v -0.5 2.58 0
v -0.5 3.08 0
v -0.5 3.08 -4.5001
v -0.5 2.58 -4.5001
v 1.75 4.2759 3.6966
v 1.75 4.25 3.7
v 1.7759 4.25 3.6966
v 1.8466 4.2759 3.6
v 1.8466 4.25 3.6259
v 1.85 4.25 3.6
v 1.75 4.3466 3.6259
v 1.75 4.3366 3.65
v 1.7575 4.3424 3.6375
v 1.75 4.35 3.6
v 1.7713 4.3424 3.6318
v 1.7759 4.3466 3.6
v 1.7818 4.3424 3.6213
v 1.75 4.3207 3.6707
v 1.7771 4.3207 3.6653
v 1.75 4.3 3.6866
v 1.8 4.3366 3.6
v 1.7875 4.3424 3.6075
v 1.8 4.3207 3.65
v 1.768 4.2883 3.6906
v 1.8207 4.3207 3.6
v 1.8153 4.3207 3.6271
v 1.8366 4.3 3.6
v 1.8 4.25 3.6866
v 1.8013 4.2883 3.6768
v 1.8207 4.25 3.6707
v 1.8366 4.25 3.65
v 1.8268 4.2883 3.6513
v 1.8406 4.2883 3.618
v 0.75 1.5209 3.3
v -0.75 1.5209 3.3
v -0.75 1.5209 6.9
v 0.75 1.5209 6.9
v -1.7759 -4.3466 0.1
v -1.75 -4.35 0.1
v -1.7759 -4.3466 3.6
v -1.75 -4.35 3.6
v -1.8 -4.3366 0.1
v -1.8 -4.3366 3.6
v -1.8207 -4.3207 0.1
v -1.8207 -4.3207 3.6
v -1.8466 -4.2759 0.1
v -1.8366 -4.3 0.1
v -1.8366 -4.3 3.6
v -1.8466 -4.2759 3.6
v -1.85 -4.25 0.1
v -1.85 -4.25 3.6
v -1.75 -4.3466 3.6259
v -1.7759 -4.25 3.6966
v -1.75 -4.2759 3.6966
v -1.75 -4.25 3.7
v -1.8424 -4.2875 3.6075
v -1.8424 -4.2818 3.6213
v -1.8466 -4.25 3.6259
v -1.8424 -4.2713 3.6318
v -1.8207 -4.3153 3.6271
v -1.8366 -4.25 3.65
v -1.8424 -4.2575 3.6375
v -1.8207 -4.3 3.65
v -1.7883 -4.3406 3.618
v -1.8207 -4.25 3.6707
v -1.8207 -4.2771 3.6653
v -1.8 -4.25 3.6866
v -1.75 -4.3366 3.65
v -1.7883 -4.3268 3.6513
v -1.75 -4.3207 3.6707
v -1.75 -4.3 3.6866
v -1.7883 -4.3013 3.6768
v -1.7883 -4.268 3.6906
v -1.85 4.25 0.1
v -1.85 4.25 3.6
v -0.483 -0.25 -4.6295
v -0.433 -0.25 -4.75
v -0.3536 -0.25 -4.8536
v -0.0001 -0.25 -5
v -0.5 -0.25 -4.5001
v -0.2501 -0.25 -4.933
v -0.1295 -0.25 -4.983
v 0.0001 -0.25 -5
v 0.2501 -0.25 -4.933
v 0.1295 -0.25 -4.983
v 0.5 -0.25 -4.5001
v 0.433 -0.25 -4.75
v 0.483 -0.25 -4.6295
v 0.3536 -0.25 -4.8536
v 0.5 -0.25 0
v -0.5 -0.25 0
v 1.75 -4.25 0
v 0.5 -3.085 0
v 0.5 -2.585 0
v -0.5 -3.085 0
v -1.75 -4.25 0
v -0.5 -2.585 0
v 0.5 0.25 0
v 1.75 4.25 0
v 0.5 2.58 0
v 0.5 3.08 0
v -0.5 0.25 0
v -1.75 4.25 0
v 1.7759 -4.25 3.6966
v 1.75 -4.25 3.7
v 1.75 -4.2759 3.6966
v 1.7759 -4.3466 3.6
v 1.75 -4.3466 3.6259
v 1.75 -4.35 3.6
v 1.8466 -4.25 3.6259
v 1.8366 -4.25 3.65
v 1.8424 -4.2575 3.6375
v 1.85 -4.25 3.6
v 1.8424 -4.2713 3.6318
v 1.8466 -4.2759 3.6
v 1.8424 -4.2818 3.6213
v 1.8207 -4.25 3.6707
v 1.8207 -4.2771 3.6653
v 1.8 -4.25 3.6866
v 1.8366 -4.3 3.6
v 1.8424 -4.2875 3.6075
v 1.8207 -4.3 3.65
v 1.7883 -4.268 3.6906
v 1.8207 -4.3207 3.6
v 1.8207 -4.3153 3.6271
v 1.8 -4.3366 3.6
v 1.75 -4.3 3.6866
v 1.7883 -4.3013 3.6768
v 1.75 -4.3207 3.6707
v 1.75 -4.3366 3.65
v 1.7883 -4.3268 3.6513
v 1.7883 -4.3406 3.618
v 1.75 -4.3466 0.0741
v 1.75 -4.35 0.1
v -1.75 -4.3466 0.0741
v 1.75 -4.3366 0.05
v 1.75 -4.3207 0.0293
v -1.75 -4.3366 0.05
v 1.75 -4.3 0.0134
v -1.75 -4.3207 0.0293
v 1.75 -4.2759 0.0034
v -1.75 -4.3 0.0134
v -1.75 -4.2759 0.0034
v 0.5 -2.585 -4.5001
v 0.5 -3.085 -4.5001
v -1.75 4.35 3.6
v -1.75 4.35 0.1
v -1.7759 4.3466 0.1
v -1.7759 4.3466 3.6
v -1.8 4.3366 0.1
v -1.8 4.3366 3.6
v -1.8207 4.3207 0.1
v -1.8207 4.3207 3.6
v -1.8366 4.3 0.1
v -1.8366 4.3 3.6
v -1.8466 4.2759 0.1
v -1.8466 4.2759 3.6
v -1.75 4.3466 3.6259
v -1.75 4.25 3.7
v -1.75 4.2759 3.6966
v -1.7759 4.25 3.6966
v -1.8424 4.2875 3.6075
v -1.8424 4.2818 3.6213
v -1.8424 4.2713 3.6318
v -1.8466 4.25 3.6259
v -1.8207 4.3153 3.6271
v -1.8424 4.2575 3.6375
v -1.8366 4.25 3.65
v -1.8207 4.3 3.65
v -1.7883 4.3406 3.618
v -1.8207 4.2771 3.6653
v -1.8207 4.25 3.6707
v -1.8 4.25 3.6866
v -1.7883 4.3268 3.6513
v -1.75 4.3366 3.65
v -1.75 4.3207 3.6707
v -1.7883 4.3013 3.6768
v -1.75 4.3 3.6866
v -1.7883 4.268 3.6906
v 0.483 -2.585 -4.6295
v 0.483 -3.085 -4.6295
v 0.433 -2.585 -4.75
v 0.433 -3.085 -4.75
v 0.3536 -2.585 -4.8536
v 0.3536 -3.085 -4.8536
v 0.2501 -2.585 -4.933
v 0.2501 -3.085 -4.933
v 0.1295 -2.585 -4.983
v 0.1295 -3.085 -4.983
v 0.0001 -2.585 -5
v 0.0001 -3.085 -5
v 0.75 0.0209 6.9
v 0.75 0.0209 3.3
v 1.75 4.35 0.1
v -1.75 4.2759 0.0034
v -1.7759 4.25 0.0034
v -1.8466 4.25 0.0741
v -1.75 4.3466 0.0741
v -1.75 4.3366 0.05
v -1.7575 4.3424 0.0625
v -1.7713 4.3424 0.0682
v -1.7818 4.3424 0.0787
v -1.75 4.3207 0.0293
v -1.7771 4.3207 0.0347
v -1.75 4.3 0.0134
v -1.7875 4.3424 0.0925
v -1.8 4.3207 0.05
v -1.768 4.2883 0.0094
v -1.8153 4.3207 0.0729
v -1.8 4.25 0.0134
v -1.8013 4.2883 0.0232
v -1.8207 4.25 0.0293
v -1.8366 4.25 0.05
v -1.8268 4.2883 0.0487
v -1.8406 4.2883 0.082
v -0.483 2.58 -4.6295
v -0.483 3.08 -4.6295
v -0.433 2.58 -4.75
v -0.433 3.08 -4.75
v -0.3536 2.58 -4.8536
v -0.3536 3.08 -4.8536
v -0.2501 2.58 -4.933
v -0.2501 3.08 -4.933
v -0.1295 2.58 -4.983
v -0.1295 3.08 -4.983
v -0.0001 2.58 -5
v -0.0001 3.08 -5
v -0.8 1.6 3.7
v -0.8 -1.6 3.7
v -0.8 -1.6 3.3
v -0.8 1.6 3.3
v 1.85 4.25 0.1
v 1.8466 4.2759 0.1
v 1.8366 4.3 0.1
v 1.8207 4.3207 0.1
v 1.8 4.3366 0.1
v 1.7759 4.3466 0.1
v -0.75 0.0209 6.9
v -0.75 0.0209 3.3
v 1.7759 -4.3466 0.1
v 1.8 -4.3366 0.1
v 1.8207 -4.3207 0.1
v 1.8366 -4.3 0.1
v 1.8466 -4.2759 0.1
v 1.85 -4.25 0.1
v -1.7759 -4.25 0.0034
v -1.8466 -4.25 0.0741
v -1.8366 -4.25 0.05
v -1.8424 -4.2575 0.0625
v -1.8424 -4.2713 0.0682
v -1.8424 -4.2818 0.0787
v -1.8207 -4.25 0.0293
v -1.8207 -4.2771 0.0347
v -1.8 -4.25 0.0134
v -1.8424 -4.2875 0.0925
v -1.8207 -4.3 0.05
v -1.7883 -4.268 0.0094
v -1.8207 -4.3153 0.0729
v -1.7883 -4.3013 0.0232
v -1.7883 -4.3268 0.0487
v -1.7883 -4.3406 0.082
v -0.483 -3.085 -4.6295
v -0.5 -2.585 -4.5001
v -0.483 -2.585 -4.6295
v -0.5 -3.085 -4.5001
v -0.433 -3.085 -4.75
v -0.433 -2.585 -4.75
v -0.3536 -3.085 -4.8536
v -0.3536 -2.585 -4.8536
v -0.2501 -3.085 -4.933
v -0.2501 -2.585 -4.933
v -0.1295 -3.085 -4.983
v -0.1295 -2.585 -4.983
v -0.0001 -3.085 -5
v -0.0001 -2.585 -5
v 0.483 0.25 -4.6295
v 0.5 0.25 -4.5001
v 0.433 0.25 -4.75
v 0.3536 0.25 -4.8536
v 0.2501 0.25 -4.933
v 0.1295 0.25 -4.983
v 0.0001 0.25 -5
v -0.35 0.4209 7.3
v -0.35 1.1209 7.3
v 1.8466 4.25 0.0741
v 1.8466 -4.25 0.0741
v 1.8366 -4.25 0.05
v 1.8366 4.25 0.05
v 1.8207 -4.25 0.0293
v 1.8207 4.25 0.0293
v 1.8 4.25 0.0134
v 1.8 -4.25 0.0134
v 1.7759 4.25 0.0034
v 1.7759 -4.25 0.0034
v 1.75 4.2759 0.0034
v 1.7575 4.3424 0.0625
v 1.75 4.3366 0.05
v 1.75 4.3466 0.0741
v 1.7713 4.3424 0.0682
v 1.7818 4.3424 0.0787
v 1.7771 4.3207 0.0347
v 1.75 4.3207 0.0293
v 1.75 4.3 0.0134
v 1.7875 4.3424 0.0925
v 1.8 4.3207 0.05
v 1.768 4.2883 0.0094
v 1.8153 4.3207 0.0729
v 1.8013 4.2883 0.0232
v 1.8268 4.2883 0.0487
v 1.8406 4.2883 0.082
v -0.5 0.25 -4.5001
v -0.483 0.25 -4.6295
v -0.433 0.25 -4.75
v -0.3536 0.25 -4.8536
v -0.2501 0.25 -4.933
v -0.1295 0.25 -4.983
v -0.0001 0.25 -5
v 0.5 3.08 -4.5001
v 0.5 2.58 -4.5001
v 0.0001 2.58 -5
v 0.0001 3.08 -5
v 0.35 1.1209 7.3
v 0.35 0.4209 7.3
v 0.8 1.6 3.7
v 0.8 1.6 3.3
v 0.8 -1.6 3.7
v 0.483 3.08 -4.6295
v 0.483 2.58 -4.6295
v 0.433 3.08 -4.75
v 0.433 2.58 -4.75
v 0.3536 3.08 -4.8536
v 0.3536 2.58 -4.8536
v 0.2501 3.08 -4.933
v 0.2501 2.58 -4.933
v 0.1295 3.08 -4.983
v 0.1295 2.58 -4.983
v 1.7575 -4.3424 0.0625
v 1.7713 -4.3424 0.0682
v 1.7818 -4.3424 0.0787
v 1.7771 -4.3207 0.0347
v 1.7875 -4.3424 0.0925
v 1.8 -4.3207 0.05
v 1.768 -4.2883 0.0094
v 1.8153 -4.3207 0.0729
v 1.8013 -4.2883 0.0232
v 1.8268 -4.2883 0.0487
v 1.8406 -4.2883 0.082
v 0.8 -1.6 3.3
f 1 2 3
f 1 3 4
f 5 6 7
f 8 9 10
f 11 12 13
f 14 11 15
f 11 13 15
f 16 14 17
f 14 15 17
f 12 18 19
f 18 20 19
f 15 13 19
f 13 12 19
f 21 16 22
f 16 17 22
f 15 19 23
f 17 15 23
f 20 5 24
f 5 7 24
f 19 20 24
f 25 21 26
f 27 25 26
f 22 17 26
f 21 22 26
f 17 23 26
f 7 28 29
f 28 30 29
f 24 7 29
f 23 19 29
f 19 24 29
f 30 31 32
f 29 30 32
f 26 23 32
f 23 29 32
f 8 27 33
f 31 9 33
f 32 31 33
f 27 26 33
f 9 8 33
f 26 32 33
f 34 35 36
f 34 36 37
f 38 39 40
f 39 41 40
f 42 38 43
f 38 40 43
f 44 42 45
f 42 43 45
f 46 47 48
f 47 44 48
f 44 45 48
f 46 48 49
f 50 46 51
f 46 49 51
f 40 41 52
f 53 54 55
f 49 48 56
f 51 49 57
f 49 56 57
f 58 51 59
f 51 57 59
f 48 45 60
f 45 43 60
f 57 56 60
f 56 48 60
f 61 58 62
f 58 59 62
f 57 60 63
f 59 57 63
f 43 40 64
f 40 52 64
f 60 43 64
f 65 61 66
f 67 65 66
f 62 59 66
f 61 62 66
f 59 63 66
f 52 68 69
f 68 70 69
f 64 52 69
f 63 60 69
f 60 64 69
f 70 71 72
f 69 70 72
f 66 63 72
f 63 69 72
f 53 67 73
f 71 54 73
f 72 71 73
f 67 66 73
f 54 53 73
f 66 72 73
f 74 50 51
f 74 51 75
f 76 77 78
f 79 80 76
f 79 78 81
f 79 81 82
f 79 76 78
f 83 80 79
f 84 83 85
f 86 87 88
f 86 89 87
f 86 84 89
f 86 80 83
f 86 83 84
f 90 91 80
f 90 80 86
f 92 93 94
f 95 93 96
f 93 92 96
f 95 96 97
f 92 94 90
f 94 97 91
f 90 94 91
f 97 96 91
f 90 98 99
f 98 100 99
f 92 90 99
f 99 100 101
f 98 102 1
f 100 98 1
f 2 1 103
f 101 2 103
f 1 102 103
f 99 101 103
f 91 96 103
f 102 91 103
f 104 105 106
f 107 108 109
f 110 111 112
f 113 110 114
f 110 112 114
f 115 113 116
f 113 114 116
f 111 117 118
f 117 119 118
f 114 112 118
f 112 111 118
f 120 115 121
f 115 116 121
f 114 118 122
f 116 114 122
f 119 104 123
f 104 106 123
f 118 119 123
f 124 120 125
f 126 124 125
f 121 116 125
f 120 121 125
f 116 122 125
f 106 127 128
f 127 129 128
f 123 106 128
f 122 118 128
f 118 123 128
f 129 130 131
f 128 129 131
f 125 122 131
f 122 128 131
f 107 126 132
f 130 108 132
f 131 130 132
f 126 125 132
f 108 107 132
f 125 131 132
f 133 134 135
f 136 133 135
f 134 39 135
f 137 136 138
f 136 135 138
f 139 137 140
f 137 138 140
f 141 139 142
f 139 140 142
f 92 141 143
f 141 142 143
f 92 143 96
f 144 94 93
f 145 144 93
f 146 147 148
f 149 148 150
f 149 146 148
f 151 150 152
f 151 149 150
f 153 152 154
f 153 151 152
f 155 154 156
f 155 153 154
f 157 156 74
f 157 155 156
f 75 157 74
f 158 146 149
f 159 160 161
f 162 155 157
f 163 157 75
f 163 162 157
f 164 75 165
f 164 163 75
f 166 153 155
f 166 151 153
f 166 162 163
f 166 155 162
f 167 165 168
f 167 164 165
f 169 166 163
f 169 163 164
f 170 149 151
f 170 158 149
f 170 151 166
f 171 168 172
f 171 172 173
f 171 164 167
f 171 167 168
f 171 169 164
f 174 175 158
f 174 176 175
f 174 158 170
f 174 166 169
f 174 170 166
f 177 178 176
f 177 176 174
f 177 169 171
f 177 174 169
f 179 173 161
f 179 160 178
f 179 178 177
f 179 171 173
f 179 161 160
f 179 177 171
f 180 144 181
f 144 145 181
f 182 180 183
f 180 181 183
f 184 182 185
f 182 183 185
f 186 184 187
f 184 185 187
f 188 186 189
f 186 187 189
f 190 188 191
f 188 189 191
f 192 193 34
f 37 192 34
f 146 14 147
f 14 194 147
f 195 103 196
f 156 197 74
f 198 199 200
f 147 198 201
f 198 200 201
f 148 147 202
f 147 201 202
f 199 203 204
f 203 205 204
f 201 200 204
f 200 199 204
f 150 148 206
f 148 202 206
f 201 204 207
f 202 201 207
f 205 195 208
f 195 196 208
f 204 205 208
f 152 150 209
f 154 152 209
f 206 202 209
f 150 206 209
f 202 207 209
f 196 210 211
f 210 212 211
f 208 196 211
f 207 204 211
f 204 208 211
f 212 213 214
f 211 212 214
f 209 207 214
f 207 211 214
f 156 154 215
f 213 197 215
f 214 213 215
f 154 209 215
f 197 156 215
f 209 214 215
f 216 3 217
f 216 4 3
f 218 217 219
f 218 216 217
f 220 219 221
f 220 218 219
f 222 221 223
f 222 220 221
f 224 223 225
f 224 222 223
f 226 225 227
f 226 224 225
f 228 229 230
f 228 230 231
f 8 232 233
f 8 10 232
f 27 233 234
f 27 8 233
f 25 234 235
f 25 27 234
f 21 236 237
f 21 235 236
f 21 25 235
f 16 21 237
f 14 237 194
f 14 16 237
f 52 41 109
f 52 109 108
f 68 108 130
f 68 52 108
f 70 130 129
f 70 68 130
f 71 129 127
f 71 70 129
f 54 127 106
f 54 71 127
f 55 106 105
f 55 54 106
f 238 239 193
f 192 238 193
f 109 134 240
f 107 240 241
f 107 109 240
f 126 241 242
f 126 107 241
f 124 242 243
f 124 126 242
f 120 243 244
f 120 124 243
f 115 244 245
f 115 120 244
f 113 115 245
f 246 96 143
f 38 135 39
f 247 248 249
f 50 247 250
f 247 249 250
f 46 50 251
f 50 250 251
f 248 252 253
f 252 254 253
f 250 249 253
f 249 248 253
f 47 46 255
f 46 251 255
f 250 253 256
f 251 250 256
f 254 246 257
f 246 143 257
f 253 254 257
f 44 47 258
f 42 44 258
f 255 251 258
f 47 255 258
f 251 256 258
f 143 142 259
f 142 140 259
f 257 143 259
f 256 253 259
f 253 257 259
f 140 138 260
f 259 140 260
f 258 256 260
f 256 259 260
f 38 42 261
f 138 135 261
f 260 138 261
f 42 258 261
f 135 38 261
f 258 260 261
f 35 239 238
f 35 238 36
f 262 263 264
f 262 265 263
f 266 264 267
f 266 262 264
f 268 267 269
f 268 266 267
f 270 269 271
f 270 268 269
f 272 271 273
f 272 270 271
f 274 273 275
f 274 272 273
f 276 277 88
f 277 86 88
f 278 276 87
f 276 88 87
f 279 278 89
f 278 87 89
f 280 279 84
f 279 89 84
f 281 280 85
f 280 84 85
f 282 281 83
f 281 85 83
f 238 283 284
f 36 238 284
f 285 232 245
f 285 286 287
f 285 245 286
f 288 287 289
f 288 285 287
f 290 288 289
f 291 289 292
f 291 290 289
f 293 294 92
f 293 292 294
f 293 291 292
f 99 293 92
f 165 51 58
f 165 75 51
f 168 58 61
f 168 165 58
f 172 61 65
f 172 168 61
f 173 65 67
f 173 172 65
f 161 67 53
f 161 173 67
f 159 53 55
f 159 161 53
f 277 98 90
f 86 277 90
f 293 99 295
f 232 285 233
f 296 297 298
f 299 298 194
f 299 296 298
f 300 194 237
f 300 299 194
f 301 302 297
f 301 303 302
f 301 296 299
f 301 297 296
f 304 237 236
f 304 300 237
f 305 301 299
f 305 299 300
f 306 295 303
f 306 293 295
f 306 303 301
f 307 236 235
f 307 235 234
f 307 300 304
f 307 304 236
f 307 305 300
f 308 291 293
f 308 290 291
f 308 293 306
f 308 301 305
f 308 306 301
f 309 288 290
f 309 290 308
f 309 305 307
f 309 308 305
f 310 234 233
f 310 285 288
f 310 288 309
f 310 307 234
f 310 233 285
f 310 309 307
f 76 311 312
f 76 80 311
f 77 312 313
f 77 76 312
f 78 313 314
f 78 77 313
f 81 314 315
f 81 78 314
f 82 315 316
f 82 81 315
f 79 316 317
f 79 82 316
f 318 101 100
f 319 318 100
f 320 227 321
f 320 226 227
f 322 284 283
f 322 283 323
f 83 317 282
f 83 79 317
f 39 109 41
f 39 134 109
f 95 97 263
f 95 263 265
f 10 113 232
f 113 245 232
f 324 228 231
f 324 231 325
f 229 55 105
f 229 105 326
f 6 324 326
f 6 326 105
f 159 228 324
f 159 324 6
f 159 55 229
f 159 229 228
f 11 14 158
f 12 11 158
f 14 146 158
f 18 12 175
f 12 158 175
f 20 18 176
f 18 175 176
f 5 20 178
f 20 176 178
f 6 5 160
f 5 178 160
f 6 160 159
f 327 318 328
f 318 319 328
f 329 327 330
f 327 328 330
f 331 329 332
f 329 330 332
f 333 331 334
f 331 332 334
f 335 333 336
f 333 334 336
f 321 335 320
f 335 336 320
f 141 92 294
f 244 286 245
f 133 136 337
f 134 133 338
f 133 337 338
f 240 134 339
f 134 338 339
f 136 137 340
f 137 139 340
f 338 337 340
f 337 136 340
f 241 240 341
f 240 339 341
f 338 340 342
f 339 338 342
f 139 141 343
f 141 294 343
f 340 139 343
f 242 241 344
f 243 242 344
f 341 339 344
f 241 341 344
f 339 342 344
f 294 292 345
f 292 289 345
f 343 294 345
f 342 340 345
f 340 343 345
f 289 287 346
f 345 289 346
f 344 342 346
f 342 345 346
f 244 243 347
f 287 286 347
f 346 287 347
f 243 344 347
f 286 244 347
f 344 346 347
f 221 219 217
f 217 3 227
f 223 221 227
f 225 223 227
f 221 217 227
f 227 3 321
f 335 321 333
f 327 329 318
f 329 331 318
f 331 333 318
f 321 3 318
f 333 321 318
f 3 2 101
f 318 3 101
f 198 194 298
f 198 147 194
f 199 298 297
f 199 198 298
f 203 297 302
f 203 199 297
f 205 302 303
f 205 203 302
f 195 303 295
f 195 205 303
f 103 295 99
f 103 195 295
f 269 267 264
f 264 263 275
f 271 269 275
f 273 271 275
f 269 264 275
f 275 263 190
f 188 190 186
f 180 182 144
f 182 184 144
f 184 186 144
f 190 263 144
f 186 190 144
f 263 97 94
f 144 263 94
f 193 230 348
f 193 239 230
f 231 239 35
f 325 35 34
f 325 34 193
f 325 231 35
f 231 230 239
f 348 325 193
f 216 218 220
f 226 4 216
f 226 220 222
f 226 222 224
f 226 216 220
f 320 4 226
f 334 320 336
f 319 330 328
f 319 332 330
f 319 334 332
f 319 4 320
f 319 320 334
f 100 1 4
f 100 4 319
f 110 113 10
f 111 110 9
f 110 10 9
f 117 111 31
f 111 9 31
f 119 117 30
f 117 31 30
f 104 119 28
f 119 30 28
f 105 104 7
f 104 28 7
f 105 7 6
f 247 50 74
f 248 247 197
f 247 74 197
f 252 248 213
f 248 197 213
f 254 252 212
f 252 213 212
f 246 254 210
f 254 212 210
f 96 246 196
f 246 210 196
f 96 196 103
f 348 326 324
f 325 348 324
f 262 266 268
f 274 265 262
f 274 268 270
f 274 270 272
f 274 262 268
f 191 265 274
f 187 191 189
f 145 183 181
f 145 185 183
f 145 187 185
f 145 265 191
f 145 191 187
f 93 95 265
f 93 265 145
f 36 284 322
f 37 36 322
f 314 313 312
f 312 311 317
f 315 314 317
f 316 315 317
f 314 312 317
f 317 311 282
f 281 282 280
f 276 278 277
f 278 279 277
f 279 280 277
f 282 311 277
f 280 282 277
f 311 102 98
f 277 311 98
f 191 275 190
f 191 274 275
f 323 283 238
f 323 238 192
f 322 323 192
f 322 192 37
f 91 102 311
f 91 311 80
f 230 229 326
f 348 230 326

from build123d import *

# Parameters (mm, degrees)
SKIZZE1_W                       = 8.7
SKIZZE1_H                       = 3.7
AUFSATZ_LINEAR_AUSTRAGEN1_DEPTH = 3.7
VERRUNDUNG1_R                   = 0.1
SKIZZE2_W                       = 1.6
SKIZZE2_H                       = 3.2
SCHNITT_LINEAR_AUSTRAGEN1_DEPTH = 0.4
SKIZZE3_W                       = 1.5
SKIZZE3_H                       = 1.5
AUFSATZ_LINEAR_AUSTRAGEN2_DEPTH = 4
FASE1_SIZE                      = 0.4
SKIZZE4_W                       = 1
SKIZZE4_H                       = 0.5
AUFSATZ_LINEAR_AUSTRAGEN3_DEPTH = 5
VERRUNDUNG2_R                   = 0.5


with BuildPart() as part:
    # Skizze1 → Aufsatz-Linear austragen1 (new body)
    with BuildSketch(Plane(origin=(0, 0, 0), x_dir=(0, 1, 0), z_dir=(0, 0, 1))):
        Rectangle(SKIZZE1_W, SKIZZE1_H)
    extrude(amount=AUFSATZ_LINEAR_AUSTRAGEN1_DEPTH)

    # Verrundung1
    verrundung1_edges = [part.edges().sort_by_distance(p)[0] for p in [
        (0, -4.35, 3.7),
        (1.85, 0, 3.7),
        (0, 4.35, 3.7),
        (1.85, 0, 0),
        (0, -4.35, 0),
        (-1.85, 0, 0),
        (0, 4.35, 0),
        (1.85, 4.35, 1.85),
        (1.85, -4.35, 1.85),
        (-1.85, -4.35, 1.85),
        (-1.85, 4.35, 1.85),
        (-1.85, 0, 3.7),
    ]]
    fillet(verrundung1_edges, radius=VERRUNDUNG1_R)

    # Skizze2 → Schnitt-Linear austragen1 (cut)
    with BuildSketch(Plane.XY.offset(3.7)):
        Rectangle(SKIZZE2_W, SKIZZE2_H)
    extrude(amount=-SCHNITT_LINEAR_AUSTRAGEN1_DEPTH, mode=Mode.SUBTRACT)

    # Skizze3 → Aufsatz-Linear austragen2 (add)
    with BuildSketch(Plane.XY.offset(3.3)):
        with Locations((0, 0.770929874)):
            Rectangle(SKIZZE3_W, SKIZZE3_H)
    extrude(amount=AUFSATZ_LINEAR_AUSTRAGEN2_DEPTH)

    # Fase1
    fase1_edges = [part.edges().sort_by_distance(p)[0] for p in [
        (0.75, 0.770929874, 7.3),
        (0, 1.520929874, 7.3),
        (-0.75, 0.770929874, 7.3),
        (0, 0.020929874, 7.3),
    ]]
    chamfer(fase1_edges, length=FASE1_SIZE)

    # Skizze4 → Aufsatz-Linear austragen3 (add)
    with BuildSketch(Plane(origin=(0, 0, 0), x_dir=(1, 0, 0), z_dir=(0, 0, -1))):
        with Locations((0, 2.835)):
            Rectangle(SKIZZE4_W, SKIZZE4_H)
        Rectangle(SKIZZE4_W, SKIZZE4_H)
        with Locations((0, -2.83)):
            Rectangle(SKIZZE4_W, SKIZZE4_H)
    extrude(amount=AUFSATZ_LINEAR_AUSTRAGEN3_DEPTH)

    # Verrundung2
    verrundung2_edges = [part.edges().sort_by_distance(p)[0] for p in [
        (-0.5, 2.83, -5),
        (0.5, 2.83, -5),
        (-0.5, 0, -5),
        (0.5, 0, -5),
        (-0.5, -2.835, -5),
        (0.5, -2.835, -5),
    ]]
    fillet(verrundung2_edges, radius=VERRUNDUNG2_R - 0.0001)  # a hair under: the kernel refuses the full size


solid = part.part
